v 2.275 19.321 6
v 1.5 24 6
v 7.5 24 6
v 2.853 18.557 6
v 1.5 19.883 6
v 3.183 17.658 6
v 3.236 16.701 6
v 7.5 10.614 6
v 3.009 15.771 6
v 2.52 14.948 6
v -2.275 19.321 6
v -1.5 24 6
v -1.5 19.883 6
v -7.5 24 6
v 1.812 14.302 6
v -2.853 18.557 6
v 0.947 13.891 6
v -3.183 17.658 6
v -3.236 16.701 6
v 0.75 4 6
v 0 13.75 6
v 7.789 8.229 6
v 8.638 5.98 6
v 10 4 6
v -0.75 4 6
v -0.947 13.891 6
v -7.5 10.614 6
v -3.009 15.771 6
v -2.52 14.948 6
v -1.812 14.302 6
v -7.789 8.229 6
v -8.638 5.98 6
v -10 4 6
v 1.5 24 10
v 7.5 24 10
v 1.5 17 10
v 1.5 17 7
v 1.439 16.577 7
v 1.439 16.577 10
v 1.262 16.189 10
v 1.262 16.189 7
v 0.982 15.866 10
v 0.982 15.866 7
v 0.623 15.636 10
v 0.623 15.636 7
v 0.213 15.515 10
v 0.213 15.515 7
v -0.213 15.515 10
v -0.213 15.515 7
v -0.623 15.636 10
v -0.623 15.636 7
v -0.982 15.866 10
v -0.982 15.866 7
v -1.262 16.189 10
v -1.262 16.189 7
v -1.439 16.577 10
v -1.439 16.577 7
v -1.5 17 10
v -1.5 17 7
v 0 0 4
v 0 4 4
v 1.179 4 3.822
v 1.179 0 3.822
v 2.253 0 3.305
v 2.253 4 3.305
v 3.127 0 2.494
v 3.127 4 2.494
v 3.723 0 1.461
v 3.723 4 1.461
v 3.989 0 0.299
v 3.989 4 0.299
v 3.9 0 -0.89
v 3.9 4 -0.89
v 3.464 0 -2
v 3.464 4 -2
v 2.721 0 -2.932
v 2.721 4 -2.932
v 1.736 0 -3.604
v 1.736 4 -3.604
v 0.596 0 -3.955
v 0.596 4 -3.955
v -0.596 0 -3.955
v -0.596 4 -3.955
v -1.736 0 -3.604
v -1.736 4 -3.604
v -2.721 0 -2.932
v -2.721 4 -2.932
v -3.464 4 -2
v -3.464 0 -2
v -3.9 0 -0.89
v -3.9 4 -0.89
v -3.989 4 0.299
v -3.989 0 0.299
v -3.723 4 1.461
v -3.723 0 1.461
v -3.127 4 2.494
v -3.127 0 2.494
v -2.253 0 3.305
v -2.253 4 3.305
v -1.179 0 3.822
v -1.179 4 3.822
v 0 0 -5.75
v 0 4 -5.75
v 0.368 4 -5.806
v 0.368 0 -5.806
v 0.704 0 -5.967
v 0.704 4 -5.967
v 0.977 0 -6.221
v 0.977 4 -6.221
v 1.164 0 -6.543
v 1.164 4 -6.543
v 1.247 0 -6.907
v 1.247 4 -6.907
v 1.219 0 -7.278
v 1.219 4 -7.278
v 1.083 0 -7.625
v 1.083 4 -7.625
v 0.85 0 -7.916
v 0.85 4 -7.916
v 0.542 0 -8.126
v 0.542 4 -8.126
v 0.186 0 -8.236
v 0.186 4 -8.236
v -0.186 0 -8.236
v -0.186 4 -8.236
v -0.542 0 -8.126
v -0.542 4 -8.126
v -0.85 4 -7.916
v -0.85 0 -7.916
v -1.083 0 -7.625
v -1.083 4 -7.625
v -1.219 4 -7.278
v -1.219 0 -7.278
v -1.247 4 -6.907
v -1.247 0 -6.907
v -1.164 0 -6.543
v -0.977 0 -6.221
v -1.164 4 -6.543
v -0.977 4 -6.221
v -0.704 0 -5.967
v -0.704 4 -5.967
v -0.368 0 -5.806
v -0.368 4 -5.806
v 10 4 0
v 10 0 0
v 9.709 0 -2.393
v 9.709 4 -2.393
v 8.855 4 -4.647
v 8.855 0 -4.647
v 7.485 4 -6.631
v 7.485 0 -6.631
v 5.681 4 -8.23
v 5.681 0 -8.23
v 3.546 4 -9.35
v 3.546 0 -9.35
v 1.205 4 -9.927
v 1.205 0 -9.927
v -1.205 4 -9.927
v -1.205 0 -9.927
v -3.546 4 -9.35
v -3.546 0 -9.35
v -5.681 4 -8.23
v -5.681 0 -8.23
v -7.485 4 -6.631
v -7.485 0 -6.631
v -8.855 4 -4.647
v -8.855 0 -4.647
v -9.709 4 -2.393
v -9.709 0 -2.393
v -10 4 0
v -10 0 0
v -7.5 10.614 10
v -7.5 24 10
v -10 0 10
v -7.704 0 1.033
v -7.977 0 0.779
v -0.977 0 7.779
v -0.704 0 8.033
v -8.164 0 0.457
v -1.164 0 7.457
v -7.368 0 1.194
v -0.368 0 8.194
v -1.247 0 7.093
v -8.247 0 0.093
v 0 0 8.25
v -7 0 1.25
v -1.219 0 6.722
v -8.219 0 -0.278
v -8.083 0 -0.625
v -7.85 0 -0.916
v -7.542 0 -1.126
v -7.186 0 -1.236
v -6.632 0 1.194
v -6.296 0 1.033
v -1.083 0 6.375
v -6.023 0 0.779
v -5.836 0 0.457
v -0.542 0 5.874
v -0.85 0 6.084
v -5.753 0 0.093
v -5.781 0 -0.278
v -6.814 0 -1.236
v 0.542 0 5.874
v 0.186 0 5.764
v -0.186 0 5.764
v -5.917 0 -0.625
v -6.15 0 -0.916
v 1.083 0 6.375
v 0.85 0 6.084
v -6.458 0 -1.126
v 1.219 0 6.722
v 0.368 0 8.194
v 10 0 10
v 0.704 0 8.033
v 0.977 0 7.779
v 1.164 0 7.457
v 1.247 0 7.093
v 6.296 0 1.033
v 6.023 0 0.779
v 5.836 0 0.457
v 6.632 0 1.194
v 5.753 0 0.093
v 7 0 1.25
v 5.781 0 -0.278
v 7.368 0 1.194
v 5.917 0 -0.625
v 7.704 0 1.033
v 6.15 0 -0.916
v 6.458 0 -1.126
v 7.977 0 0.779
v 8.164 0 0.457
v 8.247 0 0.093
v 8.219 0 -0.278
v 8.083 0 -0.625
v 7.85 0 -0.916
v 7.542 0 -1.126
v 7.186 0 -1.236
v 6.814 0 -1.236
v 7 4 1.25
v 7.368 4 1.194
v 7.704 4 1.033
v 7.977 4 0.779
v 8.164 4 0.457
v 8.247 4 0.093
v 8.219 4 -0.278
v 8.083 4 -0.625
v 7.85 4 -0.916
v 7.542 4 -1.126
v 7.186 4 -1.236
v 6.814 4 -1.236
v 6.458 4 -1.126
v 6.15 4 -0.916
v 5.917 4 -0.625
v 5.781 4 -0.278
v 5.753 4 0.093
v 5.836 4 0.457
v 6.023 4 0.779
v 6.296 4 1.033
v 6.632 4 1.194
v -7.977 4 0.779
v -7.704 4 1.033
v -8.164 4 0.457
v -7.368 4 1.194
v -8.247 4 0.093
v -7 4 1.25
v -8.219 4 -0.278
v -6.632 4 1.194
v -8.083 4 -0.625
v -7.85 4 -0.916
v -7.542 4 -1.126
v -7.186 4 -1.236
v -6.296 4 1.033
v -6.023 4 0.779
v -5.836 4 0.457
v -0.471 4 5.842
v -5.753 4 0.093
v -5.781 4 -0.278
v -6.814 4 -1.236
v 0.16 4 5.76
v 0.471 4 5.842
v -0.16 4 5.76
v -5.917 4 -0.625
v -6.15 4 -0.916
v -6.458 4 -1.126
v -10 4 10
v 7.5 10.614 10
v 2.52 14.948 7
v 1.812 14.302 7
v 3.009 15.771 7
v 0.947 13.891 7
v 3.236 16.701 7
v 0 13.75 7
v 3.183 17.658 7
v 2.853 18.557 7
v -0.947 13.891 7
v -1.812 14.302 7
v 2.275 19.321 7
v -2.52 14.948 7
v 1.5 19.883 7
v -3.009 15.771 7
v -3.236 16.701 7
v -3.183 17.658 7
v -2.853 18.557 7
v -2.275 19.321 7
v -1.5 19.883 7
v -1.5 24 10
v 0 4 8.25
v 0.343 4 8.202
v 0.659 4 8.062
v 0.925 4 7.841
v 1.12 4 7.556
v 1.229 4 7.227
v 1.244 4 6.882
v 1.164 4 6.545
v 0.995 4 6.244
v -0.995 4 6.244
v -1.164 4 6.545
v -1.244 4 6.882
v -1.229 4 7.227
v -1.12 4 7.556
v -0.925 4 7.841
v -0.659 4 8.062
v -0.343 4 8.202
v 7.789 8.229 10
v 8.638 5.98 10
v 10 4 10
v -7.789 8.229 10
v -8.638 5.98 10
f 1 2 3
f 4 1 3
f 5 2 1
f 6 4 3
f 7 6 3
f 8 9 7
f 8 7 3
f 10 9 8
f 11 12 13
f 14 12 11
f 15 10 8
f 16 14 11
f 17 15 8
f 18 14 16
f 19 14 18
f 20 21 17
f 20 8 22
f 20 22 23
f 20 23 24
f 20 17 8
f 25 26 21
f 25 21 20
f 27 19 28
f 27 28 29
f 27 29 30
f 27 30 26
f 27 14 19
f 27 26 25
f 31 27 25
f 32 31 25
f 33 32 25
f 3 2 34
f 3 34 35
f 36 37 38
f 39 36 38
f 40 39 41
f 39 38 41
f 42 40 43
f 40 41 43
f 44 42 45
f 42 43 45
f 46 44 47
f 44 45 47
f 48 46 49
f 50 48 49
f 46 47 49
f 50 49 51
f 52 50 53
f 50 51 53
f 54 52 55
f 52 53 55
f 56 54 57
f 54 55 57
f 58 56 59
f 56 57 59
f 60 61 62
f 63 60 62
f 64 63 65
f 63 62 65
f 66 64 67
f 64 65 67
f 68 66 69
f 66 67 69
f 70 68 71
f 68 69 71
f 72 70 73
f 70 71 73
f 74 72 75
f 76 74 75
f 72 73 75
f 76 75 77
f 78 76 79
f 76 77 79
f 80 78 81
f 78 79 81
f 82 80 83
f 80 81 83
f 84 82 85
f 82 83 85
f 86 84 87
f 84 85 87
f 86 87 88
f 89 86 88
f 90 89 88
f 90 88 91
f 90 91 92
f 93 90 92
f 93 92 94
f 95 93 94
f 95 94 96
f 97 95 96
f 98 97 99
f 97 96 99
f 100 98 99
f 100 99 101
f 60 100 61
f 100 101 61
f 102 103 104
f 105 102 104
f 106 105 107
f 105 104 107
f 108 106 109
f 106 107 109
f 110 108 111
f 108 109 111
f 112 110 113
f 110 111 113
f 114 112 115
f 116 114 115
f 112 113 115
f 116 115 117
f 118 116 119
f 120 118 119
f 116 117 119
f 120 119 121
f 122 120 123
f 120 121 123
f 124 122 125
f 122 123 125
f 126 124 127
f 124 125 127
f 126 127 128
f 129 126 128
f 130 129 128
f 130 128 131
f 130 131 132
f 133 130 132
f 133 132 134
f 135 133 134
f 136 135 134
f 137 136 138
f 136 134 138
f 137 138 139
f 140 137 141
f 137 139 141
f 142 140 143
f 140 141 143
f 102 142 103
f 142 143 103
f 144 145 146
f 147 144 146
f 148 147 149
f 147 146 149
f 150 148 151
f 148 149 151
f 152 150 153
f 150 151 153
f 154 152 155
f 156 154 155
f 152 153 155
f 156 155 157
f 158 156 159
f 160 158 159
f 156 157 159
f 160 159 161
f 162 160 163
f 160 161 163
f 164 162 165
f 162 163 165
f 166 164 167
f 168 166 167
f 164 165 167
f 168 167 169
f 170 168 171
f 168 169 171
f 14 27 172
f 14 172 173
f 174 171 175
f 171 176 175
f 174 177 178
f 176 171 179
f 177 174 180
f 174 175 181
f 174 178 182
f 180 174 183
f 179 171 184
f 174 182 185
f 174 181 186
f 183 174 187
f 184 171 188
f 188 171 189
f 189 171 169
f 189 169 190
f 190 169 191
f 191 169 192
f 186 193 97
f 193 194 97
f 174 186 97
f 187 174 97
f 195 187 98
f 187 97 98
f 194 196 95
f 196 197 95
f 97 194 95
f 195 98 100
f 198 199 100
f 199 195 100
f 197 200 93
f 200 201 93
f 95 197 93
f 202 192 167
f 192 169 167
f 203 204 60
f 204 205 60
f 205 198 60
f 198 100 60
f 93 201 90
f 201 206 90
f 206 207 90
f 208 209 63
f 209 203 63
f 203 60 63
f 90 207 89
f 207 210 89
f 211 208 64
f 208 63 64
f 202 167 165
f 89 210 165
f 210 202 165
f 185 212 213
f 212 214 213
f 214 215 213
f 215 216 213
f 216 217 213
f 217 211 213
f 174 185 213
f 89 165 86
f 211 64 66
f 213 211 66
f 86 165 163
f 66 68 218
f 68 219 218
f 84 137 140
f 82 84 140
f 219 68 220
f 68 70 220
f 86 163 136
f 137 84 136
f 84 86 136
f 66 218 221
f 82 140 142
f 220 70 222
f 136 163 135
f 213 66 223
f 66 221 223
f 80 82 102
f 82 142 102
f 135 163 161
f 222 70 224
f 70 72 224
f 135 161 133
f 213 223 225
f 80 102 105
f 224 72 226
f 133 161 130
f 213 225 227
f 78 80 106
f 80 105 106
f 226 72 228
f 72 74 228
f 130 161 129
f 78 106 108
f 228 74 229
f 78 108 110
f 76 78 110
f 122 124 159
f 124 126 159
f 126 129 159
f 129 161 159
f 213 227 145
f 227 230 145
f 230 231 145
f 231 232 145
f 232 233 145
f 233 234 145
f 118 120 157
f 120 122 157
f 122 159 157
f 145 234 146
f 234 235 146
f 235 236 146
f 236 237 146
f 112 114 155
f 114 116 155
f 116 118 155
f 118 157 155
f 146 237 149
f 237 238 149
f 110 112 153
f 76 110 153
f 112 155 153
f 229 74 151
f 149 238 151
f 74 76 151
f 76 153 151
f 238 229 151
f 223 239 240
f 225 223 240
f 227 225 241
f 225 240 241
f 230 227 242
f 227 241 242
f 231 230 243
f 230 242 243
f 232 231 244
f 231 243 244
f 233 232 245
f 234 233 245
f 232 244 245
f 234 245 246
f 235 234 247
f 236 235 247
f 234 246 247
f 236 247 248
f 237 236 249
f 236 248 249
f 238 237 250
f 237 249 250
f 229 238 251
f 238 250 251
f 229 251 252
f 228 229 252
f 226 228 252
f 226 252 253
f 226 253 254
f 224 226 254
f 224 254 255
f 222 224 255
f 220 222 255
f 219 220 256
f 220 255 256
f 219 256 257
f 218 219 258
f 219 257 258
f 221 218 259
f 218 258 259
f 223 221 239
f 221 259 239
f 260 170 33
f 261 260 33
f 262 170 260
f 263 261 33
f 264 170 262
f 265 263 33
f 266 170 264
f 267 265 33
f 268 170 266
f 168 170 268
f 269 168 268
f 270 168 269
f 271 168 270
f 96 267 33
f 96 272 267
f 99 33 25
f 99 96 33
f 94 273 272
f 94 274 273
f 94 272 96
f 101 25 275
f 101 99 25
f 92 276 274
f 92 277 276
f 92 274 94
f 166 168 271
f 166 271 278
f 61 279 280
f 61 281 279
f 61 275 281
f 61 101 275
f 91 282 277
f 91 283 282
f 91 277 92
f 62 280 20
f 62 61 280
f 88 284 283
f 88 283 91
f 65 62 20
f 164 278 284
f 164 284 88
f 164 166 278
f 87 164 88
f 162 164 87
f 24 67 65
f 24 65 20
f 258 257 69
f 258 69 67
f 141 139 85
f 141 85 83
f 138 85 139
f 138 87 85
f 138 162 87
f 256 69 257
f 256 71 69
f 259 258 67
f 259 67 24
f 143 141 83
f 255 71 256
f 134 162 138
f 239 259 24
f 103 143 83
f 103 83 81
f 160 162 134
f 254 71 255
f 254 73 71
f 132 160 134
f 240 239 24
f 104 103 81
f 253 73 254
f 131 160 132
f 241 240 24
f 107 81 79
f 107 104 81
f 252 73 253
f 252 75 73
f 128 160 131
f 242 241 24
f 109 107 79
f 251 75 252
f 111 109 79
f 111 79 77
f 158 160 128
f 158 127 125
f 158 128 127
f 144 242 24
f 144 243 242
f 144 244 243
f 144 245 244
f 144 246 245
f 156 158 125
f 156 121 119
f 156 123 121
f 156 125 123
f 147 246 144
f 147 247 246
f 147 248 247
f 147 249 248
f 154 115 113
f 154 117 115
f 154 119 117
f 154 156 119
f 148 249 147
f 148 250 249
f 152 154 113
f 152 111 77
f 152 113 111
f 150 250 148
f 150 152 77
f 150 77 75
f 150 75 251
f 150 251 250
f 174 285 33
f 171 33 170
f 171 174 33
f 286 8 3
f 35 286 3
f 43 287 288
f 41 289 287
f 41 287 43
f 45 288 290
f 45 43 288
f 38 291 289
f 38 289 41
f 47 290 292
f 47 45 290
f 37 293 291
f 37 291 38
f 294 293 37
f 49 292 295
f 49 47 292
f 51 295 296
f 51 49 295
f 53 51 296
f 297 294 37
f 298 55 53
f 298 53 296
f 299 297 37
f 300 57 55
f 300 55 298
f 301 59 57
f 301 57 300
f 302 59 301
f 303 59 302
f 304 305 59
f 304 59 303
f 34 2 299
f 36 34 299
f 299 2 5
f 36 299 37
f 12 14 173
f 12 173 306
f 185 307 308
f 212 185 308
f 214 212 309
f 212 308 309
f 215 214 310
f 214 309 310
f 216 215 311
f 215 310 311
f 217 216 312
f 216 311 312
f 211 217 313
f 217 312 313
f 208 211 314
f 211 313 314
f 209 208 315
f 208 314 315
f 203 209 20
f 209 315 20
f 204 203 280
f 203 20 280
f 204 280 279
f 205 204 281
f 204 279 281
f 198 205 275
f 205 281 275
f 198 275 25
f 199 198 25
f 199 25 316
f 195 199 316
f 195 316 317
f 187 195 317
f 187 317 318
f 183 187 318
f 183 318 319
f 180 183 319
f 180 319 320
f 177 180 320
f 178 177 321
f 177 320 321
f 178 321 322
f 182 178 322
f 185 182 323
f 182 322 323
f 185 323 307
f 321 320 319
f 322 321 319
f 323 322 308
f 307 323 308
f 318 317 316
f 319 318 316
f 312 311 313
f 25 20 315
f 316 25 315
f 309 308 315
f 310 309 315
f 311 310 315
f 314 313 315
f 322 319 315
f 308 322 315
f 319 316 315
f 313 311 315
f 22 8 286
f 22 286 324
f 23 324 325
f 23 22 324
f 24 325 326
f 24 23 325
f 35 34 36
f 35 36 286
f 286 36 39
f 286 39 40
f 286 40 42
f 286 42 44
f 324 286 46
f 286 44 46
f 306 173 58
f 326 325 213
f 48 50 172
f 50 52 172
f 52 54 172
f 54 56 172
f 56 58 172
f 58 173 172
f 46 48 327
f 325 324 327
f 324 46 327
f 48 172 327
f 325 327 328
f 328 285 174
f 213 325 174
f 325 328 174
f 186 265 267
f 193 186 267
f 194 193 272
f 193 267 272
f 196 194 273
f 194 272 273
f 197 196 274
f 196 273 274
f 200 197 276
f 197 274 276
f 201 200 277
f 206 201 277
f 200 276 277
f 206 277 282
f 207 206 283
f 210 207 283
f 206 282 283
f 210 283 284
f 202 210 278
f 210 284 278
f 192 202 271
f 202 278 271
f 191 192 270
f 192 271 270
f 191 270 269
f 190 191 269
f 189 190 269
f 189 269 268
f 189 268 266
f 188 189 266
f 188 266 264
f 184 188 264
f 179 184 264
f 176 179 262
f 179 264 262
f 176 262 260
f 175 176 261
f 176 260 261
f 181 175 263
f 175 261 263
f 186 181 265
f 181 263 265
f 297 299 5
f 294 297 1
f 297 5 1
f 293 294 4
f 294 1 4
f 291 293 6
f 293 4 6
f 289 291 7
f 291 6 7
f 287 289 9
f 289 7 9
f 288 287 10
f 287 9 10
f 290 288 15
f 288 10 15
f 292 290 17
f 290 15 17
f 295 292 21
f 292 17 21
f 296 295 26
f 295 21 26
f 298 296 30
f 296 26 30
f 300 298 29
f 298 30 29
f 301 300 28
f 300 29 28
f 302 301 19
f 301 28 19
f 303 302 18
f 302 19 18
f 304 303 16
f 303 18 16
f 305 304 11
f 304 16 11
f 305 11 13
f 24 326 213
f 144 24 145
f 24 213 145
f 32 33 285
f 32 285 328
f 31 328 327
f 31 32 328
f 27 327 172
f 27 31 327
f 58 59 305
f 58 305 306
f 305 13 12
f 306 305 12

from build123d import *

# Parameters (mm, degrees)
BOSS_EXTRUDE1_DEPTH = 4
SKETCH3_R           = 4
SKETCH3_R_2         = 1.25
CUT_EXTRUDE1_DEPTH  = 4
SKETCH4_W           = 20
SKETCH4_H           = 4
BOSS_EXTRUDE2_DEPTH = 20
SKETCH5_R           = 1.5
CUT_EXTRUDE2_DEPTH  = 30
SKETCH6_R           = 3.25
CUT_EXTRUDE3_DEPTH  = 1
SKETCH7_W           = 2.5
SKETCH7_H           = 20
CUT_EXTRUDE4_DEPTH  = 4
FILLET1_R           = 10


with BuildPart() as part:
    # Sketch1 → Boss-Extrude1 (new body)
    with BuildSketch(Plane(origin=(0, 0, 0), x_dir=(1, 0, 0), z_dir=(0, 1, 0))):
        with BuildLine():
            Line((-10, -10), (10, -10))
            Line((10, -10), (10, 0))
            ThreePointArc((10, 0), (0, 10), (-10, 0))
            Line((-10, 0), (-10, -10))
        make_face()
    extrude(amount=BOSS_EXTRUDE1_DEPTH)

    # Sketch3 → Cut-Extrude1 (cut)
    with BuildSketch(Plane(origin=(0, 4, 0), x_dir=(1, 0, 0), z_dir=(0, 1, 0))):
        with Locations(Location((0, 0, 0), (0, 0, 270))):
            Circle(SKETCH3_R)
        with Locations(Location((0, 7, 0), (0, 0, 270))):
            Circle(SKETCH3_R_2)
        with Locations(Location((7, 0, 0), (0, 0, 270))):
            Circle(SKETCH3_R_2)
        with Locations(Location((0, -7, 0), (0, 0, 270))):
            Circle(SKETCH3_R_2)
        with Locations(Location((-7, 0, 0), (0, 0, 270))):
            Circle(SKETCH3_R_2)
    extrude(amount=-CUT_EXTRUDE1_DEPTH, mode=Mode.SUBTRACT)

    # Sketch4 → Boss-Extrude2 (add)
    with BuildSketch(Plane(origin=(0, 4, 0), x_dir=(1, 0, 0), z_dir=(0, 1, 0))):
        with Locations((0, -8)):
            Rectangle(SKETCH4_W, SKETCH4_H)
    extrude(amount=BOSS_EXTRUDE2_DEPTH)

    # Sketch5 → Cut-Extrude2 (cut)
    with BuildSketch(Plane(origin=(0, 0, 6), x_dir=(-1, 0, 0), z_dir=(0, 0, -1))):
        with BuildLine():
            Line((-1.5, 24), (-1.5, 17))
            ThreePointArc((-1.5, 17), (0, 18.5), (1.5, 17))
            Line((1.5, 17), (1.5, 24))
            Line((1.5, 24), (-1.5, 24))
        make_face()
        with Locations((0, 17)):
            Circle(SKETCH5_R)
    extrude(amount=-CUT_EXTRUDE2_DEPTH, mode=Mode.SUBTRACT)

    # Sketch6 → Cut-Extrude3 (cut)
    with BuildSketch(Plane(origin=(0, 0, 6), x_dir=(-1, 0, 0), z_dir=(0, 0, -1))):
        with Locations((0, 17)):
            Circle(SKETCH6_R)
    extrude(amount=-CUT_EXTRUDE3_DEPTH, mode=Mode.SUBTRACT)

    # Sketch7 → Cut-Extrude4 (cut)
    with BuildSketch(Plane(origin=(0, 0, 6), x_dir=(-1, 0, 0), z_dir=(0, 0, -1))):
        with Locations((8.75, 14)):
            Rectangle(SKETCH7_W, SKETCH7_H)
        with Locations((-8.75, 14)):
            Rectangle(SKETCH7_W, SKETCH7_H)
    extrude(amount=-CUT_EXTRUDE4_DEPTH, mode=Mode.SUBTRACT)

    # Fillet1
    # the kernel refuses this fillet: 10 mm, written as the material it adds along each edge
    with BuildSketch(Plane(origin=(7.5, 4, 6), x_dir=(0, 1, 0), z_dir=(0, 0, 1))) as fillet1_piece_1:
        with BuildLine():
            CenterArc((6.614378278, -10), FILLET1_R, 90, 41.409622109)
            Line((0, -2.5), (0, 0))
            Line((0, 0), (6.614378278, 0))
        make_face()
    extrude(amount=4)
    with BuildSketch(Plane(origin=(-7.5, 4, 6), x_dir=(0, 1, 0), z_dir=(0, 0, 1))) as fillet1_piece_2:
        with BuildLine():
            CenterArc((6.614378278, 10), FILLET1_R, 228.590377891, 41.409622109)
            Line((0, 2.5), (0, 0))
            Line((0, 0), (6.614378278, 0))
        make_face()
    extrude(amount=4)


solid = part.part
